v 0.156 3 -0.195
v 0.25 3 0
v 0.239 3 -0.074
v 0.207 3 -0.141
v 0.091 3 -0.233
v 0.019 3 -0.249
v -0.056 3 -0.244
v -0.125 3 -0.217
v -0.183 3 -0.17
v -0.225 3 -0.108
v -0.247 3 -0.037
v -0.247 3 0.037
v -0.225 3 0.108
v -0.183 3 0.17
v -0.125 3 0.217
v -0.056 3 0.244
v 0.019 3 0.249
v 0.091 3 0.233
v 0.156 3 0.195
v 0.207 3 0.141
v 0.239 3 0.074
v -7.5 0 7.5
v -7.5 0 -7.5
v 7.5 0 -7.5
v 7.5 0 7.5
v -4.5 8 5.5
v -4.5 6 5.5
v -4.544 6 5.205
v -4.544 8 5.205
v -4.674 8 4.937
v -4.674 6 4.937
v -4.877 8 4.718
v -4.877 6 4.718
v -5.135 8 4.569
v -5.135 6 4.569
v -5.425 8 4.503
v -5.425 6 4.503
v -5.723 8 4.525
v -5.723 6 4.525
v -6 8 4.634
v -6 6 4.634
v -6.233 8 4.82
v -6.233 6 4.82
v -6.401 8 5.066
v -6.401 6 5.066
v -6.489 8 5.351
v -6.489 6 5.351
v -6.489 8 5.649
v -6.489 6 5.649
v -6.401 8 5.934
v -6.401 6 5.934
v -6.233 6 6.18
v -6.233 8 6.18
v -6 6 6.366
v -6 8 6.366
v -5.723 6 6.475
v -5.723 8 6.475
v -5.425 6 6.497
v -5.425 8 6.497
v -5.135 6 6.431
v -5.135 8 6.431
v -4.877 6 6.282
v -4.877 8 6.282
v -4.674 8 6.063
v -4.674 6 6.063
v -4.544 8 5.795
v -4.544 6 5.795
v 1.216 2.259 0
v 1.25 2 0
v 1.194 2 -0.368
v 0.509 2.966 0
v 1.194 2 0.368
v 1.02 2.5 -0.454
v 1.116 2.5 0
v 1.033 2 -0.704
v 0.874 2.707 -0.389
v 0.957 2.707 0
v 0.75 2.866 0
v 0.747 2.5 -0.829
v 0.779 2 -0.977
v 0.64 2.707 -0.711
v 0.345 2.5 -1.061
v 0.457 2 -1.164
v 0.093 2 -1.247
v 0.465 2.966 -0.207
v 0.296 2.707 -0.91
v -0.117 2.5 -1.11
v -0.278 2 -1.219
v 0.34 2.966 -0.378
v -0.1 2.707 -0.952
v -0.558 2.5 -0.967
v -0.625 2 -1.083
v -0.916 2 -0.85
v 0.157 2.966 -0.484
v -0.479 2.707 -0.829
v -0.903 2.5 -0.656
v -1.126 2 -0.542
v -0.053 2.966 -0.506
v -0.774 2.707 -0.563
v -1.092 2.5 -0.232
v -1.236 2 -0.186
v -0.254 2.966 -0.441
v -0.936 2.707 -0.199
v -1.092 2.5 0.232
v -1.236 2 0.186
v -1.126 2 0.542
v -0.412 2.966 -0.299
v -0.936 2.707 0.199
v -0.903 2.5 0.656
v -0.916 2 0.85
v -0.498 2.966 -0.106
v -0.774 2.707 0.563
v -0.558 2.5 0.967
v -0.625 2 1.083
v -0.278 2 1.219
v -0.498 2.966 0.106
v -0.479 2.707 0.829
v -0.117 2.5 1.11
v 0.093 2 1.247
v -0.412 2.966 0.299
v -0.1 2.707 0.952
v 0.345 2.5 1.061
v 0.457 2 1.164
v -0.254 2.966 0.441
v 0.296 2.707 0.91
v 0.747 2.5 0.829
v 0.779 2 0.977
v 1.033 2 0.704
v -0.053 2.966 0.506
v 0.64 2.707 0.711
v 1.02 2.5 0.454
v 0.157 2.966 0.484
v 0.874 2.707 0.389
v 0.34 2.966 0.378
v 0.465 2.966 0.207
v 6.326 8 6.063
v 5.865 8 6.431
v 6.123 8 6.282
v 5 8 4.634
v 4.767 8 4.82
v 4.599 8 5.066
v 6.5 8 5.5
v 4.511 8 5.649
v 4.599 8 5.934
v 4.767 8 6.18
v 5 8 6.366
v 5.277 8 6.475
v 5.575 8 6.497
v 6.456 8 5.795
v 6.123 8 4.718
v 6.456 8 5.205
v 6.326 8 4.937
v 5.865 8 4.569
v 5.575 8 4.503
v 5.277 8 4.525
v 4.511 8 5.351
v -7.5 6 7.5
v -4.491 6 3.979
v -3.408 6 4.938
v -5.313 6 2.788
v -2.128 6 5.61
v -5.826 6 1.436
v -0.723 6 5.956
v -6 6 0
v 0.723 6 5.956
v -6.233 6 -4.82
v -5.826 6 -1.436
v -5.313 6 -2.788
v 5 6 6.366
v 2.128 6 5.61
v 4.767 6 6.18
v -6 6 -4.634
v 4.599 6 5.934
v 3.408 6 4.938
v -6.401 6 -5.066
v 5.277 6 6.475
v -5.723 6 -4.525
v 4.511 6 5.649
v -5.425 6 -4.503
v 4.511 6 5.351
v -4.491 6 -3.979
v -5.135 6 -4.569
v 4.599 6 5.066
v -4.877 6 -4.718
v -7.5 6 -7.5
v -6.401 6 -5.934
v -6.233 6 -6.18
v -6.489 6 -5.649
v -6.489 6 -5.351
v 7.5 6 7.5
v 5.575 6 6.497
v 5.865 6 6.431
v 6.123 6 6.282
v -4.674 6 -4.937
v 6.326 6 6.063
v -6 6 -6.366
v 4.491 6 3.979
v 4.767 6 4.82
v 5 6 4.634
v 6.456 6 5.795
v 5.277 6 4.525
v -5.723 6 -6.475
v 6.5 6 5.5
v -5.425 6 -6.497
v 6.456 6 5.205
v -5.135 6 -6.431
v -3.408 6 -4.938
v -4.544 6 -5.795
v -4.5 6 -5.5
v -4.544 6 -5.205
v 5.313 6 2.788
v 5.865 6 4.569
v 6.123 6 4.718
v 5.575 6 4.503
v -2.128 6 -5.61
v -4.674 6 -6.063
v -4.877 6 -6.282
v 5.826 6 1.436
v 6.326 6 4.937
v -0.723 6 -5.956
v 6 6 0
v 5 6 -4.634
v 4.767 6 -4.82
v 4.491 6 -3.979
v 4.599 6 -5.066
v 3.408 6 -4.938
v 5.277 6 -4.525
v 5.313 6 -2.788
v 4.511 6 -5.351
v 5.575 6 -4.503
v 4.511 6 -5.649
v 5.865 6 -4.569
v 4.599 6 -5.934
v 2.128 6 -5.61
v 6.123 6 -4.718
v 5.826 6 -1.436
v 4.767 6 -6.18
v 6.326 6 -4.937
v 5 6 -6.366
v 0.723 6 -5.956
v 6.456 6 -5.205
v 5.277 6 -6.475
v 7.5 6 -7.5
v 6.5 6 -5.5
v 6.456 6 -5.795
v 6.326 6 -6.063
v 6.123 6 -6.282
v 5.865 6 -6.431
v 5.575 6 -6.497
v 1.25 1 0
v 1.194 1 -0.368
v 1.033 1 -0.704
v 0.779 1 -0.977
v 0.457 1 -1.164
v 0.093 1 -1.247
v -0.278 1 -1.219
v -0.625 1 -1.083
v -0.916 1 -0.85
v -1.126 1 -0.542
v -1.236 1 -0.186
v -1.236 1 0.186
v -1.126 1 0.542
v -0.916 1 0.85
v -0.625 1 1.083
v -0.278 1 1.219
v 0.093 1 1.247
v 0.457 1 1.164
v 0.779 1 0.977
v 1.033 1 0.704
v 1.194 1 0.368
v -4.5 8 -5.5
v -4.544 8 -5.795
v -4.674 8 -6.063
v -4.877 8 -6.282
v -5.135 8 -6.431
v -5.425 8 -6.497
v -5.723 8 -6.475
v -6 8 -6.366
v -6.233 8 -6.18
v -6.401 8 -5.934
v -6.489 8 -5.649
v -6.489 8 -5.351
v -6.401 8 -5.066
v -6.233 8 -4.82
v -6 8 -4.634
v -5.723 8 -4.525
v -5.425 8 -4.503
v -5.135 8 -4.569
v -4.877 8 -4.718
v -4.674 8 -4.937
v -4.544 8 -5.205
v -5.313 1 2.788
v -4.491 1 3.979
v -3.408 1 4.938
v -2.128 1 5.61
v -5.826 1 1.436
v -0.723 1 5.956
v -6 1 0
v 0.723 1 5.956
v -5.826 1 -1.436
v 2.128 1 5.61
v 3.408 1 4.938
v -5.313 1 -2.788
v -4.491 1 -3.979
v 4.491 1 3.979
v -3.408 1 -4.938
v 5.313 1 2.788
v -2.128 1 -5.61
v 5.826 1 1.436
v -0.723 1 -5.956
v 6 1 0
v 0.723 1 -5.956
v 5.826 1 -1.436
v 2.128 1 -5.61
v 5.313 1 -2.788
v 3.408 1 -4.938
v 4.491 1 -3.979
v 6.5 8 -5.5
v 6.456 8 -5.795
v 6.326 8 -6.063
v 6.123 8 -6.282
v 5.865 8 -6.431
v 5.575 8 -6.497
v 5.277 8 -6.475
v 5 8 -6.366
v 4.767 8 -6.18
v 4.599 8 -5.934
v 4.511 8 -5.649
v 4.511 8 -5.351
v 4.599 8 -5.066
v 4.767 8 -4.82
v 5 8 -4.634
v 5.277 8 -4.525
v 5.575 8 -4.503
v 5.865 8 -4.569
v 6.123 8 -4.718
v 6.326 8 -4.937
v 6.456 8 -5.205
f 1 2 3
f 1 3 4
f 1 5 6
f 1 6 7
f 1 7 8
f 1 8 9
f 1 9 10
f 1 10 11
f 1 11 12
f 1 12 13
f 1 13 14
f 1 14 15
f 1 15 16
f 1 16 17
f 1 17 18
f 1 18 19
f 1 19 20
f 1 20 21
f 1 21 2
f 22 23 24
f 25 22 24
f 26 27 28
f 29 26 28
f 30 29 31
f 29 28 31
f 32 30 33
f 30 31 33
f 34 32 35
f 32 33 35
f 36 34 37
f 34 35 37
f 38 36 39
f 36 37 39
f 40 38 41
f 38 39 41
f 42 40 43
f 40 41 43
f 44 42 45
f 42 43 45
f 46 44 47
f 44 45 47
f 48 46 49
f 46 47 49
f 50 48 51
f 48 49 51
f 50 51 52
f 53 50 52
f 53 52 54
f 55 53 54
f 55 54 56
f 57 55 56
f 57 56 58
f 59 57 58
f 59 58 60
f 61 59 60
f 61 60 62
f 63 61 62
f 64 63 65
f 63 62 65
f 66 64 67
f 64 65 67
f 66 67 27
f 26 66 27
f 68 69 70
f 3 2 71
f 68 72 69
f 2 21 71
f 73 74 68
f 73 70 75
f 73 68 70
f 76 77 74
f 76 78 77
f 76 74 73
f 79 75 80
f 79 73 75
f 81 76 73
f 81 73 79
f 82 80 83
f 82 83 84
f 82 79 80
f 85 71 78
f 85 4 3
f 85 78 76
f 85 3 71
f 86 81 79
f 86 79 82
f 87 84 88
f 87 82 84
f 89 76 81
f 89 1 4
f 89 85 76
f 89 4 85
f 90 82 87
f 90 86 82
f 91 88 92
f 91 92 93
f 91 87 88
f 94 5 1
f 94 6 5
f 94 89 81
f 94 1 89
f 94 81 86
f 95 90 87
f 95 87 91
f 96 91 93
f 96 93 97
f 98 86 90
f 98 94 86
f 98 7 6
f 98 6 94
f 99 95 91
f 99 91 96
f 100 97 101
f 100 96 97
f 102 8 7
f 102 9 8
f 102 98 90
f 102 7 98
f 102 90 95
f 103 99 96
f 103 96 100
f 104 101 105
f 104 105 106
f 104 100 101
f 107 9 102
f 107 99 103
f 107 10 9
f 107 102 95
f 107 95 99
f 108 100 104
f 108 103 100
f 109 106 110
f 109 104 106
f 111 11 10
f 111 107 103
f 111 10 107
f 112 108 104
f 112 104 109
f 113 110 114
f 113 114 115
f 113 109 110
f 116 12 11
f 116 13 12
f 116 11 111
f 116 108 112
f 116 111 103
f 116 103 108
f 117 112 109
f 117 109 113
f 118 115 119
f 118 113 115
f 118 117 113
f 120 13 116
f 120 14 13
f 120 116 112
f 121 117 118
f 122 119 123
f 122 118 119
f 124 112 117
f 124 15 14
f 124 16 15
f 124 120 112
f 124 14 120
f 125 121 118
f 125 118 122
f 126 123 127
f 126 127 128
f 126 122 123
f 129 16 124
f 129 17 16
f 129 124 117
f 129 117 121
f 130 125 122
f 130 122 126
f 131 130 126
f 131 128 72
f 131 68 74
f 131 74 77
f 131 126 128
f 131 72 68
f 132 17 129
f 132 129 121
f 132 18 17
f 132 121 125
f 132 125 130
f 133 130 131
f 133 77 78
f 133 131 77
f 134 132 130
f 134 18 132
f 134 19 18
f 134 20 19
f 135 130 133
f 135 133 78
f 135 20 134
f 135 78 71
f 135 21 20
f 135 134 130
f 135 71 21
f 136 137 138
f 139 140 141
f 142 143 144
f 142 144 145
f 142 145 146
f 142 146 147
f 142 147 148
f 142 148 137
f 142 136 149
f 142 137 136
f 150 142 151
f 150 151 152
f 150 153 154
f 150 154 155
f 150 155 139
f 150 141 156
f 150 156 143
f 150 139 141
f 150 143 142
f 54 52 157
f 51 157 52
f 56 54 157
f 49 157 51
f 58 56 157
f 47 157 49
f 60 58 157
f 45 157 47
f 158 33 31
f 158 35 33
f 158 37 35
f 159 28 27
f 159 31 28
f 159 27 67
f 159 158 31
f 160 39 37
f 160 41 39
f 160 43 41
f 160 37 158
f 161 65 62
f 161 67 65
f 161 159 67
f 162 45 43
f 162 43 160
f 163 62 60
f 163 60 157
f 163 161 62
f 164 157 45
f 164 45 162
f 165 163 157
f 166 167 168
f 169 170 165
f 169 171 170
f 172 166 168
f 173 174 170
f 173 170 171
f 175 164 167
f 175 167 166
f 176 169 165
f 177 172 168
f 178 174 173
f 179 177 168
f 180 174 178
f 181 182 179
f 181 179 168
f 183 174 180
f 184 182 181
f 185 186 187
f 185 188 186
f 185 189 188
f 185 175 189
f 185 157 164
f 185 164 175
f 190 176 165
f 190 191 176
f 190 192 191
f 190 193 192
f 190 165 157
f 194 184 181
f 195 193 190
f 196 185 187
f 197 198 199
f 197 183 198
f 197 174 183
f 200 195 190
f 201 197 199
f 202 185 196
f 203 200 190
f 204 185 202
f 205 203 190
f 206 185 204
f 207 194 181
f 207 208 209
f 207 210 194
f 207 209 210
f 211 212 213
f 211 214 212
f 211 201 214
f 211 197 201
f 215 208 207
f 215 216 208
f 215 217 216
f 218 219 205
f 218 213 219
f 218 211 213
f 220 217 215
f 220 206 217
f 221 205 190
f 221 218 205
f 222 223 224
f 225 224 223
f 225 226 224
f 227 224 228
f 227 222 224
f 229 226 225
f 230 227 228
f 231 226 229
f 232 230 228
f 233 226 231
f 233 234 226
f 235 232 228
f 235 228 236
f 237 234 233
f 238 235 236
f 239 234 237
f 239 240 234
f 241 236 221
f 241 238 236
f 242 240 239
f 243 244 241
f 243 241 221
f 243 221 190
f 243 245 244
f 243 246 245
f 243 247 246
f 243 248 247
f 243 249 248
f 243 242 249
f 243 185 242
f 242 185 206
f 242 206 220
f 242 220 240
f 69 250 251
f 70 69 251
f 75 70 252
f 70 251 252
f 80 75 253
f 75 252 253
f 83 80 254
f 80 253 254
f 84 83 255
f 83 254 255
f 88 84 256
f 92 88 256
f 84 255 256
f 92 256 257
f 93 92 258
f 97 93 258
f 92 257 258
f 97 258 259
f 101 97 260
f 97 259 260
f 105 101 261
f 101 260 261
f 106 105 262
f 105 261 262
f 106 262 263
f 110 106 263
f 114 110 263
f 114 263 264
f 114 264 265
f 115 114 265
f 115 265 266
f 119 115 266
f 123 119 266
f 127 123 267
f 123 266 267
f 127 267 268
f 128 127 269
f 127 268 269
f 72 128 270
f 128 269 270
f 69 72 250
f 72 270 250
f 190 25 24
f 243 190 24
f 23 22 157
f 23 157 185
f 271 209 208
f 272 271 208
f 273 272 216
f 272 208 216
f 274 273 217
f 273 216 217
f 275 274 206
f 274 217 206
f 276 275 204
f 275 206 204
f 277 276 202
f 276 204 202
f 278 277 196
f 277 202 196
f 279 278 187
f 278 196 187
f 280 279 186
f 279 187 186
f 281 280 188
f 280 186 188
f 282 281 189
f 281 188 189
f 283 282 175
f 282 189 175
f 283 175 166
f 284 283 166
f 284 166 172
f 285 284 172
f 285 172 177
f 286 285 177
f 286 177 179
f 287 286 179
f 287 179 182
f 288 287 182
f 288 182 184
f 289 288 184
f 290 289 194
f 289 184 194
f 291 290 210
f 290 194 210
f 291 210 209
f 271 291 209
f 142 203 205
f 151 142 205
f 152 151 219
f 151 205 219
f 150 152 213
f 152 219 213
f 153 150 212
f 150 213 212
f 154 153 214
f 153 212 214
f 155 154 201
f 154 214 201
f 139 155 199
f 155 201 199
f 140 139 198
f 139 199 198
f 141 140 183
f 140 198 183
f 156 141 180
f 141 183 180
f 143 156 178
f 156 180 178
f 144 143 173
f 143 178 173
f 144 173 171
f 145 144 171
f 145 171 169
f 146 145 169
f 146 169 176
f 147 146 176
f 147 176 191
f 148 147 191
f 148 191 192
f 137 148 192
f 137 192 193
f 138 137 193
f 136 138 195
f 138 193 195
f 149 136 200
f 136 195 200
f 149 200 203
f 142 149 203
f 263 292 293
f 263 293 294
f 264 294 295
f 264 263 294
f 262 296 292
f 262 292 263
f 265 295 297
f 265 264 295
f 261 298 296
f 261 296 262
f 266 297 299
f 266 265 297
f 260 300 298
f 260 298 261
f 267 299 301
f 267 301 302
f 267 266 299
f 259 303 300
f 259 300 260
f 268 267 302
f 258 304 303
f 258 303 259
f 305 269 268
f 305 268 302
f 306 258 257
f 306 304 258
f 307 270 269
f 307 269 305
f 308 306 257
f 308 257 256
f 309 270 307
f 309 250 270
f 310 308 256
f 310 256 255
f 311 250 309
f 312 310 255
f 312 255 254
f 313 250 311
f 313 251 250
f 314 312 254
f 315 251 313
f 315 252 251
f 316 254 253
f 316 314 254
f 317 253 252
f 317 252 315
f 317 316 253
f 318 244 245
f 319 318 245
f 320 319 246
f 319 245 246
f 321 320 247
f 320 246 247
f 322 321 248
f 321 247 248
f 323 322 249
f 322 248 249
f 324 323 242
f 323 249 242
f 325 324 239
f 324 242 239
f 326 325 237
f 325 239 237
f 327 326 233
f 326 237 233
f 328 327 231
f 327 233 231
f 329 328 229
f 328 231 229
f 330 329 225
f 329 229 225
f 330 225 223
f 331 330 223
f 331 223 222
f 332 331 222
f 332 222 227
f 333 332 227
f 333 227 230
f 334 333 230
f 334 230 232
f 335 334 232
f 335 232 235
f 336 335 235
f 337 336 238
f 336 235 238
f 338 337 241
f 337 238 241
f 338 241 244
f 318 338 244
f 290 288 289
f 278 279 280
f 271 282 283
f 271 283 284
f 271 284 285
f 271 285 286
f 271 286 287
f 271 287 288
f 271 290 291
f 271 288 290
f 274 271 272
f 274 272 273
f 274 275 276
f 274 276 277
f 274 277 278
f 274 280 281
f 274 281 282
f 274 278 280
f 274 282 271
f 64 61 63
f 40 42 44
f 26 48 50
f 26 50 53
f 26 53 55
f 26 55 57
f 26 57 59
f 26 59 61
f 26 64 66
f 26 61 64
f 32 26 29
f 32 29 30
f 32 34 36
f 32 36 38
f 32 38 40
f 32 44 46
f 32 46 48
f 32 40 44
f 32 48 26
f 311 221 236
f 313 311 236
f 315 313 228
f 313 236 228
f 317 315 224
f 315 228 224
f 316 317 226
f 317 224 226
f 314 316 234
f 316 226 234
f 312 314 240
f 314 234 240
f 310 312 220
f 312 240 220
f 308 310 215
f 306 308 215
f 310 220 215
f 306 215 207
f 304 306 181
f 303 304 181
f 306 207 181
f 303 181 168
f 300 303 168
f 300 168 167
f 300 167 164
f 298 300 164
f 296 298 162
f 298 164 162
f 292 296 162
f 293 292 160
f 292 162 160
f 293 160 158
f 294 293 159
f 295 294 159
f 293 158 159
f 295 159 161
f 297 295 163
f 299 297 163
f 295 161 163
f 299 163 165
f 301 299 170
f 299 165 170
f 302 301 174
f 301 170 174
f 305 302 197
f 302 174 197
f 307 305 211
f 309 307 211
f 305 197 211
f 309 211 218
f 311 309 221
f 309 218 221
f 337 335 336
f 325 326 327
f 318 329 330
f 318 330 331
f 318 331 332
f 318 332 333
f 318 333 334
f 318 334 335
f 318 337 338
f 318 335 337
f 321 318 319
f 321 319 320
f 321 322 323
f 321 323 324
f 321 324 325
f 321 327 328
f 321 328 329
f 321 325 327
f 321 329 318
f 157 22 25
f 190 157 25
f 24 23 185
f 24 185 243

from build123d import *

# Parameters (mm, degrees)
SKETCH1_W           = 15
SKETCH1_H           = 15
BOSS_EXTRUDE1_DEPTH = 6
SKETCH2_R           = 6
CUT_EXTRUDE1_DEPTH  = 5
SKETCH3_R           = 1.25
BOSS_EXTRUDE2_DEPTH = 2
FILLET1_R           = 1
SKETCH4_R           = 1
BOSS_EXTRUDE3_DEPTH = 2


with BuildPart() as part:
    # Sketch1 → Boss-Extrude1 (new body)
    with BuildSketch(Plane(origin=(0, 0, 0), x_dir=(1, 0, 0), z_dir=(0, 1, 0))):
        Rectangle(SKETCH1_W, SKETCH1_H)
    extrude(amount=BOSS_EXTRUDE1_DEPTH)

    # Sketch2 → Cut-Extrude1 (cut)
    with BuildSketch(Plane(origin=(0, 6, 0), x_dir=(1, 0, 0), z_dir=(0, 1, 0))):
        Circle(SKETCH2_R)
    extrude(amount=-CUT_EXTRUDE1_DEPTH, mode=Mode.SUBTRACT)

    # Sketch3 → Boss-Extrude2 (add)
    with BuildSketch(Plane(origin=(0, 1, 0), x_dir=(1, 0, 0), z_dir=(0, 1, 0))):
        Circle(SKETCH3_R)
    extrude(amount=BOSS_EXTRUDE2_DEPTH)

    # Fillet1
    fillet1_edges = [part.edges().sort_by_distance(p)[0] for p in [
        (-1.25, 3, 0),
    ]]
    fillet(fillet1_edges, radius=FILLET1_R)

    # Sketch4 → Boss-Extrude3 (add)
    with BuildSketch(Plane(origin=(0, 6, 0), x_dir=(1, 0, 0), z_dir=(0, 1, 0))):
        with Locations((-5.5, 5.5)):
            Circle(SKETCH4_R)
        with Locations((5.5, 5.5)):
            Circle(SKETCH4_R)
        with Locations((-5.5, -5.5)):
            Circle(SKETCH4_R)
        with Locations((5.5, -5.5)):
            Circle(SKETCH4_R)
    extrude(amount=BOSS_EXTRUDE3_DEPTH)


solid = part.part
